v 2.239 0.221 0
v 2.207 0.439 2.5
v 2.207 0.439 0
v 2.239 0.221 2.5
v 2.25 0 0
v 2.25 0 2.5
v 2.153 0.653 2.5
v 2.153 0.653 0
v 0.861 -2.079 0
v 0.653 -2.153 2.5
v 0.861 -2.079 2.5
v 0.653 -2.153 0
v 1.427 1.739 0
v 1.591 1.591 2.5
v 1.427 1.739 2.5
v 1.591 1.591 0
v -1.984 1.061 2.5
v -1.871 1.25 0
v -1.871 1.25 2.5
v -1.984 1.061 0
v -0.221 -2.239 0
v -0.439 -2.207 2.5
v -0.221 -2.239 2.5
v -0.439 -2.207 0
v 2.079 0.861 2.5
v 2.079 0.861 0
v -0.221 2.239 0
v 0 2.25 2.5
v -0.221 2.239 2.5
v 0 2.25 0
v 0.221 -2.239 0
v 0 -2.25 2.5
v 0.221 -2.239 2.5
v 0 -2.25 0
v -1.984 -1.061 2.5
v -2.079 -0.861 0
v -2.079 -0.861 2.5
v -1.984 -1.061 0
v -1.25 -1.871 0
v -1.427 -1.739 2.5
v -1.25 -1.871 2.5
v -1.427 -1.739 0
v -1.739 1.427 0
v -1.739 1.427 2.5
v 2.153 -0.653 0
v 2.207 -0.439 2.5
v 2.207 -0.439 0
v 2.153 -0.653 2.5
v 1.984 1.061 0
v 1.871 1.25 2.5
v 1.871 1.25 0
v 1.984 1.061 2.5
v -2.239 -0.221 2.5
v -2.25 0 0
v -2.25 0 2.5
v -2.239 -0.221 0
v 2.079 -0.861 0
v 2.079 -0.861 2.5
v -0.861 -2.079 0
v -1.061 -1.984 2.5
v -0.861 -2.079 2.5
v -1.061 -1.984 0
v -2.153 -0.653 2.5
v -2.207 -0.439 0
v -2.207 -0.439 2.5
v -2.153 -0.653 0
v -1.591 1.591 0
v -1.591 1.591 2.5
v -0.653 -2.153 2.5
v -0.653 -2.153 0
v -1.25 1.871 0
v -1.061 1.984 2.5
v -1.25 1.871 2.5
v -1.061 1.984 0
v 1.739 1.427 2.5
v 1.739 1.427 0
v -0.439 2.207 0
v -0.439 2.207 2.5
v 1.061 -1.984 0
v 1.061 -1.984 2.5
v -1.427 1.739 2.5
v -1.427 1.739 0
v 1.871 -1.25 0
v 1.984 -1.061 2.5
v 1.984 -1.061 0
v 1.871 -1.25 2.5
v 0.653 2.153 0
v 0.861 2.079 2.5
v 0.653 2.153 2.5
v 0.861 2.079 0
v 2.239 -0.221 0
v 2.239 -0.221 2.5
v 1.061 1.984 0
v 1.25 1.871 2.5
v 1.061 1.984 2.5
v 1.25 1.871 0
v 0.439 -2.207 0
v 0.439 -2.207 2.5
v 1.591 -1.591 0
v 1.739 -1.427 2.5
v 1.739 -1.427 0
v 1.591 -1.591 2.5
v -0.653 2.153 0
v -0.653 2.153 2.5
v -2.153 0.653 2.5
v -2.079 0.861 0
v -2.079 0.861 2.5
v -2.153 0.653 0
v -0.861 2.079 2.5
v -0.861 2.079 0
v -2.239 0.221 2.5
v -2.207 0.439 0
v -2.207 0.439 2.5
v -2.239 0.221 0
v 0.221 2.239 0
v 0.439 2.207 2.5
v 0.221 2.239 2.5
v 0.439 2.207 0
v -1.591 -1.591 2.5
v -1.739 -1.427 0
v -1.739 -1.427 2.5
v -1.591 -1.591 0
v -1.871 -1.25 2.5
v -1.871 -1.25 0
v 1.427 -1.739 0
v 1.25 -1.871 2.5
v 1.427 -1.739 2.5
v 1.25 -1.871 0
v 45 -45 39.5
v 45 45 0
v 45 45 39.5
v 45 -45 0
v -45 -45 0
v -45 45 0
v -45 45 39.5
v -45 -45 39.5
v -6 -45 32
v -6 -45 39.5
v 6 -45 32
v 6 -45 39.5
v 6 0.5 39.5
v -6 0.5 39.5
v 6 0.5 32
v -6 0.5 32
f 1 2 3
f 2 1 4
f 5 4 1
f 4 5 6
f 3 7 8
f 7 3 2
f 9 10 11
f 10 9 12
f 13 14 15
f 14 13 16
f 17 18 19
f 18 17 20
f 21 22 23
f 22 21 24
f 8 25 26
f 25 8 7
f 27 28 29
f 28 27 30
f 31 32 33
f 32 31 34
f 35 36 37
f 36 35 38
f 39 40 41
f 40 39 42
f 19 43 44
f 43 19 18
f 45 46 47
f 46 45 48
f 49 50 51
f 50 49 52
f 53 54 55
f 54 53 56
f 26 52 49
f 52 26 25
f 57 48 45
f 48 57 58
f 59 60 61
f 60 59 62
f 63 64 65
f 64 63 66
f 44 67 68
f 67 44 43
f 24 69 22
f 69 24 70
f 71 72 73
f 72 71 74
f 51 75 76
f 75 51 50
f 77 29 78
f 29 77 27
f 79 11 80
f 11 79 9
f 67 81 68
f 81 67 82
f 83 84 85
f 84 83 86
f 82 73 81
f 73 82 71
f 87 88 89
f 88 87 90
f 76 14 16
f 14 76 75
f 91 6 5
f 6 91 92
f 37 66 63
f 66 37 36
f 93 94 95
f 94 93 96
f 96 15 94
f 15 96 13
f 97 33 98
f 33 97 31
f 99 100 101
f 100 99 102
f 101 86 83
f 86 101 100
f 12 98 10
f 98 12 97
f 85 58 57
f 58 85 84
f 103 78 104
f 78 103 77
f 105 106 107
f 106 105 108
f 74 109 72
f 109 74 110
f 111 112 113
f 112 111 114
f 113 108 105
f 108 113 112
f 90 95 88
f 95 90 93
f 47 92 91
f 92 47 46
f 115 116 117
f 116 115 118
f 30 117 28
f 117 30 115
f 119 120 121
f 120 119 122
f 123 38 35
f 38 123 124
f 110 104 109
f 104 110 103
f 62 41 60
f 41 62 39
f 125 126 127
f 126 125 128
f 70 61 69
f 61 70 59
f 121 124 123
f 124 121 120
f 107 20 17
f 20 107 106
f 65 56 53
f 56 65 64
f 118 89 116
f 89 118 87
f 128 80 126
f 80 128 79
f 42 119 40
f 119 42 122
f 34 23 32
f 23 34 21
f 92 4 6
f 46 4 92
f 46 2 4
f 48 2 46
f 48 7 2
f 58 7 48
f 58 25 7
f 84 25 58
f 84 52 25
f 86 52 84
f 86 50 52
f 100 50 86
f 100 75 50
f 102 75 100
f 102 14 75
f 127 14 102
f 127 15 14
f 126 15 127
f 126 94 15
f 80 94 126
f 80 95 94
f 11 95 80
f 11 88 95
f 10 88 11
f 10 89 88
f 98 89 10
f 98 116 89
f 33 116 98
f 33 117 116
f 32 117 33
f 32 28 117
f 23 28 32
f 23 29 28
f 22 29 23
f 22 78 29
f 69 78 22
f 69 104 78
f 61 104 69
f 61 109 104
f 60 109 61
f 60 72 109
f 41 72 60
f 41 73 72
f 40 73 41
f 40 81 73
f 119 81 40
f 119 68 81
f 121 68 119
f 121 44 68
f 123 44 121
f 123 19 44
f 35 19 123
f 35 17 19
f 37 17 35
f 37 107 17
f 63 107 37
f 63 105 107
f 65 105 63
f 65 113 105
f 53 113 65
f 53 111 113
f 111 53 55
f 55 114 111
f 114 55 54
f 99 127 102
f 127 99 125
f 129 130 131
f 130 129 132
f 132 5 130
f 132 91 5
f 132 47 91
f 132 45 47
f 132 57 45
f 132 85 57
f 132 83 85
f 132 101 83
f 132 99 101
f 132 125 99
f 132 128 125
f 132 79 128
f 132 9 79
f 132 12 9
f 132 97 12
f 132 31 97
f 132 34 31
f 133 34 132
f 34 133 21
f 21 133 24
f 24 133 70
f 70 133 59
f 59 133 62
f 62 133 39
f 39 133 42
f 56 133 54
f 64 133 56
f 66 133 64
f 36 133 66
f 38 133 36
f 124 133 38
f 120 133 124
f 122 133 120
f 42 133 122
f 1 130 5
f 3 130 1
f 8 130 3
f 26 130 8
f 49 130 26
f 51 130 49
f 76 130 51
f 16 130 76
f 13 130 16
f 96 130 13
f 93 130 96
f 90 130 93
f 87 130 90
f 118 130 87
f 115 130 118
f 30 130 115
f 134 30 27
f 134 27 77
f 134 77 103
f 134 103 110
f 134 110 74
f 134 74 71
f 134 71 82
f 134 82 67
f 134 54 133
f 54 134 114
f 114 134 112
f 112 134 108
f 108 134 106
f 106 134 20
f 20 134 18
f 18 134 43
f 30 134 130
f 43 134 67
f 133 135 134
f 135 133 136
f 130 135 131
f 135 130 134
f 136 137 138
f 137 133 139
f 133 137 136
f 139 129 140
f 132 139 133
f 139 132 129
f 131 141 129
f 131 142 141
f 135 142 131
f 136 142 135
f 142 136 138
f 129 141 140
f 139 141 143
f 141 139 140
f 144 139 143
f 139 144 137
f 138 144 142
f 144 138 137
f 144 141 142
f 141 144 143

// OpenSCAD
// Magnetic stirrer housing for 80 mm PC case fan
// Print orientation: top plate on bed (z = 0), walls build upward (+Z)

// ---------- Dimensions ----------
plate_t      = 2;     // top plate thickness
wall_t       = 2.5;   // wall thickness
box_h        = 40;    // outer wall height (open top at z = 40)
outer_x      = 90;    // outer size in X
outer_y      = 90;    // outer size in Y
hole_d       = 4.5;   // M4 screw hole diameter
hole_pitch   = 71.5;  // screw hole pattern: square on this diagonal
notch_w      = 12;    // cable notch width
notch_depth  = 8;     // cable notch depth from open edge (z = 32 to 40)
eps          = 0.5;   // cutter overshoot past faces

$fn = 64;

// ---------- Model ----------
difference() {
    // Solid outer block
    translate([-outer_x/2, -outer_y/2, 0])
        cube([outer_x, outer_y, box_h]);

    // Open top (cut 1 mm into the block so the opening has no coplanar face)
    translate([-outer_x/2, -outer_y/2, box_h - eps])
        cube([outer_x, outer_y, eps + 1]);

    // Screw holes through the top plate, centred on the plate
    for (a = [0, 90, 180, 270])
        rotate([0, 0, a])
            translate([0, 0, -eps])
                cylinder(d = hole_d, h = plate_t + 2*eps);

    // Cable notch in one wall, centred along X, open at the top edge
    translate([-notch_w/2, -outer_y/2 - eps, box_h - notch_depth])
        cube([notch_w, outer_y/2 + 2*eps, notch_depth + eps]);
}
